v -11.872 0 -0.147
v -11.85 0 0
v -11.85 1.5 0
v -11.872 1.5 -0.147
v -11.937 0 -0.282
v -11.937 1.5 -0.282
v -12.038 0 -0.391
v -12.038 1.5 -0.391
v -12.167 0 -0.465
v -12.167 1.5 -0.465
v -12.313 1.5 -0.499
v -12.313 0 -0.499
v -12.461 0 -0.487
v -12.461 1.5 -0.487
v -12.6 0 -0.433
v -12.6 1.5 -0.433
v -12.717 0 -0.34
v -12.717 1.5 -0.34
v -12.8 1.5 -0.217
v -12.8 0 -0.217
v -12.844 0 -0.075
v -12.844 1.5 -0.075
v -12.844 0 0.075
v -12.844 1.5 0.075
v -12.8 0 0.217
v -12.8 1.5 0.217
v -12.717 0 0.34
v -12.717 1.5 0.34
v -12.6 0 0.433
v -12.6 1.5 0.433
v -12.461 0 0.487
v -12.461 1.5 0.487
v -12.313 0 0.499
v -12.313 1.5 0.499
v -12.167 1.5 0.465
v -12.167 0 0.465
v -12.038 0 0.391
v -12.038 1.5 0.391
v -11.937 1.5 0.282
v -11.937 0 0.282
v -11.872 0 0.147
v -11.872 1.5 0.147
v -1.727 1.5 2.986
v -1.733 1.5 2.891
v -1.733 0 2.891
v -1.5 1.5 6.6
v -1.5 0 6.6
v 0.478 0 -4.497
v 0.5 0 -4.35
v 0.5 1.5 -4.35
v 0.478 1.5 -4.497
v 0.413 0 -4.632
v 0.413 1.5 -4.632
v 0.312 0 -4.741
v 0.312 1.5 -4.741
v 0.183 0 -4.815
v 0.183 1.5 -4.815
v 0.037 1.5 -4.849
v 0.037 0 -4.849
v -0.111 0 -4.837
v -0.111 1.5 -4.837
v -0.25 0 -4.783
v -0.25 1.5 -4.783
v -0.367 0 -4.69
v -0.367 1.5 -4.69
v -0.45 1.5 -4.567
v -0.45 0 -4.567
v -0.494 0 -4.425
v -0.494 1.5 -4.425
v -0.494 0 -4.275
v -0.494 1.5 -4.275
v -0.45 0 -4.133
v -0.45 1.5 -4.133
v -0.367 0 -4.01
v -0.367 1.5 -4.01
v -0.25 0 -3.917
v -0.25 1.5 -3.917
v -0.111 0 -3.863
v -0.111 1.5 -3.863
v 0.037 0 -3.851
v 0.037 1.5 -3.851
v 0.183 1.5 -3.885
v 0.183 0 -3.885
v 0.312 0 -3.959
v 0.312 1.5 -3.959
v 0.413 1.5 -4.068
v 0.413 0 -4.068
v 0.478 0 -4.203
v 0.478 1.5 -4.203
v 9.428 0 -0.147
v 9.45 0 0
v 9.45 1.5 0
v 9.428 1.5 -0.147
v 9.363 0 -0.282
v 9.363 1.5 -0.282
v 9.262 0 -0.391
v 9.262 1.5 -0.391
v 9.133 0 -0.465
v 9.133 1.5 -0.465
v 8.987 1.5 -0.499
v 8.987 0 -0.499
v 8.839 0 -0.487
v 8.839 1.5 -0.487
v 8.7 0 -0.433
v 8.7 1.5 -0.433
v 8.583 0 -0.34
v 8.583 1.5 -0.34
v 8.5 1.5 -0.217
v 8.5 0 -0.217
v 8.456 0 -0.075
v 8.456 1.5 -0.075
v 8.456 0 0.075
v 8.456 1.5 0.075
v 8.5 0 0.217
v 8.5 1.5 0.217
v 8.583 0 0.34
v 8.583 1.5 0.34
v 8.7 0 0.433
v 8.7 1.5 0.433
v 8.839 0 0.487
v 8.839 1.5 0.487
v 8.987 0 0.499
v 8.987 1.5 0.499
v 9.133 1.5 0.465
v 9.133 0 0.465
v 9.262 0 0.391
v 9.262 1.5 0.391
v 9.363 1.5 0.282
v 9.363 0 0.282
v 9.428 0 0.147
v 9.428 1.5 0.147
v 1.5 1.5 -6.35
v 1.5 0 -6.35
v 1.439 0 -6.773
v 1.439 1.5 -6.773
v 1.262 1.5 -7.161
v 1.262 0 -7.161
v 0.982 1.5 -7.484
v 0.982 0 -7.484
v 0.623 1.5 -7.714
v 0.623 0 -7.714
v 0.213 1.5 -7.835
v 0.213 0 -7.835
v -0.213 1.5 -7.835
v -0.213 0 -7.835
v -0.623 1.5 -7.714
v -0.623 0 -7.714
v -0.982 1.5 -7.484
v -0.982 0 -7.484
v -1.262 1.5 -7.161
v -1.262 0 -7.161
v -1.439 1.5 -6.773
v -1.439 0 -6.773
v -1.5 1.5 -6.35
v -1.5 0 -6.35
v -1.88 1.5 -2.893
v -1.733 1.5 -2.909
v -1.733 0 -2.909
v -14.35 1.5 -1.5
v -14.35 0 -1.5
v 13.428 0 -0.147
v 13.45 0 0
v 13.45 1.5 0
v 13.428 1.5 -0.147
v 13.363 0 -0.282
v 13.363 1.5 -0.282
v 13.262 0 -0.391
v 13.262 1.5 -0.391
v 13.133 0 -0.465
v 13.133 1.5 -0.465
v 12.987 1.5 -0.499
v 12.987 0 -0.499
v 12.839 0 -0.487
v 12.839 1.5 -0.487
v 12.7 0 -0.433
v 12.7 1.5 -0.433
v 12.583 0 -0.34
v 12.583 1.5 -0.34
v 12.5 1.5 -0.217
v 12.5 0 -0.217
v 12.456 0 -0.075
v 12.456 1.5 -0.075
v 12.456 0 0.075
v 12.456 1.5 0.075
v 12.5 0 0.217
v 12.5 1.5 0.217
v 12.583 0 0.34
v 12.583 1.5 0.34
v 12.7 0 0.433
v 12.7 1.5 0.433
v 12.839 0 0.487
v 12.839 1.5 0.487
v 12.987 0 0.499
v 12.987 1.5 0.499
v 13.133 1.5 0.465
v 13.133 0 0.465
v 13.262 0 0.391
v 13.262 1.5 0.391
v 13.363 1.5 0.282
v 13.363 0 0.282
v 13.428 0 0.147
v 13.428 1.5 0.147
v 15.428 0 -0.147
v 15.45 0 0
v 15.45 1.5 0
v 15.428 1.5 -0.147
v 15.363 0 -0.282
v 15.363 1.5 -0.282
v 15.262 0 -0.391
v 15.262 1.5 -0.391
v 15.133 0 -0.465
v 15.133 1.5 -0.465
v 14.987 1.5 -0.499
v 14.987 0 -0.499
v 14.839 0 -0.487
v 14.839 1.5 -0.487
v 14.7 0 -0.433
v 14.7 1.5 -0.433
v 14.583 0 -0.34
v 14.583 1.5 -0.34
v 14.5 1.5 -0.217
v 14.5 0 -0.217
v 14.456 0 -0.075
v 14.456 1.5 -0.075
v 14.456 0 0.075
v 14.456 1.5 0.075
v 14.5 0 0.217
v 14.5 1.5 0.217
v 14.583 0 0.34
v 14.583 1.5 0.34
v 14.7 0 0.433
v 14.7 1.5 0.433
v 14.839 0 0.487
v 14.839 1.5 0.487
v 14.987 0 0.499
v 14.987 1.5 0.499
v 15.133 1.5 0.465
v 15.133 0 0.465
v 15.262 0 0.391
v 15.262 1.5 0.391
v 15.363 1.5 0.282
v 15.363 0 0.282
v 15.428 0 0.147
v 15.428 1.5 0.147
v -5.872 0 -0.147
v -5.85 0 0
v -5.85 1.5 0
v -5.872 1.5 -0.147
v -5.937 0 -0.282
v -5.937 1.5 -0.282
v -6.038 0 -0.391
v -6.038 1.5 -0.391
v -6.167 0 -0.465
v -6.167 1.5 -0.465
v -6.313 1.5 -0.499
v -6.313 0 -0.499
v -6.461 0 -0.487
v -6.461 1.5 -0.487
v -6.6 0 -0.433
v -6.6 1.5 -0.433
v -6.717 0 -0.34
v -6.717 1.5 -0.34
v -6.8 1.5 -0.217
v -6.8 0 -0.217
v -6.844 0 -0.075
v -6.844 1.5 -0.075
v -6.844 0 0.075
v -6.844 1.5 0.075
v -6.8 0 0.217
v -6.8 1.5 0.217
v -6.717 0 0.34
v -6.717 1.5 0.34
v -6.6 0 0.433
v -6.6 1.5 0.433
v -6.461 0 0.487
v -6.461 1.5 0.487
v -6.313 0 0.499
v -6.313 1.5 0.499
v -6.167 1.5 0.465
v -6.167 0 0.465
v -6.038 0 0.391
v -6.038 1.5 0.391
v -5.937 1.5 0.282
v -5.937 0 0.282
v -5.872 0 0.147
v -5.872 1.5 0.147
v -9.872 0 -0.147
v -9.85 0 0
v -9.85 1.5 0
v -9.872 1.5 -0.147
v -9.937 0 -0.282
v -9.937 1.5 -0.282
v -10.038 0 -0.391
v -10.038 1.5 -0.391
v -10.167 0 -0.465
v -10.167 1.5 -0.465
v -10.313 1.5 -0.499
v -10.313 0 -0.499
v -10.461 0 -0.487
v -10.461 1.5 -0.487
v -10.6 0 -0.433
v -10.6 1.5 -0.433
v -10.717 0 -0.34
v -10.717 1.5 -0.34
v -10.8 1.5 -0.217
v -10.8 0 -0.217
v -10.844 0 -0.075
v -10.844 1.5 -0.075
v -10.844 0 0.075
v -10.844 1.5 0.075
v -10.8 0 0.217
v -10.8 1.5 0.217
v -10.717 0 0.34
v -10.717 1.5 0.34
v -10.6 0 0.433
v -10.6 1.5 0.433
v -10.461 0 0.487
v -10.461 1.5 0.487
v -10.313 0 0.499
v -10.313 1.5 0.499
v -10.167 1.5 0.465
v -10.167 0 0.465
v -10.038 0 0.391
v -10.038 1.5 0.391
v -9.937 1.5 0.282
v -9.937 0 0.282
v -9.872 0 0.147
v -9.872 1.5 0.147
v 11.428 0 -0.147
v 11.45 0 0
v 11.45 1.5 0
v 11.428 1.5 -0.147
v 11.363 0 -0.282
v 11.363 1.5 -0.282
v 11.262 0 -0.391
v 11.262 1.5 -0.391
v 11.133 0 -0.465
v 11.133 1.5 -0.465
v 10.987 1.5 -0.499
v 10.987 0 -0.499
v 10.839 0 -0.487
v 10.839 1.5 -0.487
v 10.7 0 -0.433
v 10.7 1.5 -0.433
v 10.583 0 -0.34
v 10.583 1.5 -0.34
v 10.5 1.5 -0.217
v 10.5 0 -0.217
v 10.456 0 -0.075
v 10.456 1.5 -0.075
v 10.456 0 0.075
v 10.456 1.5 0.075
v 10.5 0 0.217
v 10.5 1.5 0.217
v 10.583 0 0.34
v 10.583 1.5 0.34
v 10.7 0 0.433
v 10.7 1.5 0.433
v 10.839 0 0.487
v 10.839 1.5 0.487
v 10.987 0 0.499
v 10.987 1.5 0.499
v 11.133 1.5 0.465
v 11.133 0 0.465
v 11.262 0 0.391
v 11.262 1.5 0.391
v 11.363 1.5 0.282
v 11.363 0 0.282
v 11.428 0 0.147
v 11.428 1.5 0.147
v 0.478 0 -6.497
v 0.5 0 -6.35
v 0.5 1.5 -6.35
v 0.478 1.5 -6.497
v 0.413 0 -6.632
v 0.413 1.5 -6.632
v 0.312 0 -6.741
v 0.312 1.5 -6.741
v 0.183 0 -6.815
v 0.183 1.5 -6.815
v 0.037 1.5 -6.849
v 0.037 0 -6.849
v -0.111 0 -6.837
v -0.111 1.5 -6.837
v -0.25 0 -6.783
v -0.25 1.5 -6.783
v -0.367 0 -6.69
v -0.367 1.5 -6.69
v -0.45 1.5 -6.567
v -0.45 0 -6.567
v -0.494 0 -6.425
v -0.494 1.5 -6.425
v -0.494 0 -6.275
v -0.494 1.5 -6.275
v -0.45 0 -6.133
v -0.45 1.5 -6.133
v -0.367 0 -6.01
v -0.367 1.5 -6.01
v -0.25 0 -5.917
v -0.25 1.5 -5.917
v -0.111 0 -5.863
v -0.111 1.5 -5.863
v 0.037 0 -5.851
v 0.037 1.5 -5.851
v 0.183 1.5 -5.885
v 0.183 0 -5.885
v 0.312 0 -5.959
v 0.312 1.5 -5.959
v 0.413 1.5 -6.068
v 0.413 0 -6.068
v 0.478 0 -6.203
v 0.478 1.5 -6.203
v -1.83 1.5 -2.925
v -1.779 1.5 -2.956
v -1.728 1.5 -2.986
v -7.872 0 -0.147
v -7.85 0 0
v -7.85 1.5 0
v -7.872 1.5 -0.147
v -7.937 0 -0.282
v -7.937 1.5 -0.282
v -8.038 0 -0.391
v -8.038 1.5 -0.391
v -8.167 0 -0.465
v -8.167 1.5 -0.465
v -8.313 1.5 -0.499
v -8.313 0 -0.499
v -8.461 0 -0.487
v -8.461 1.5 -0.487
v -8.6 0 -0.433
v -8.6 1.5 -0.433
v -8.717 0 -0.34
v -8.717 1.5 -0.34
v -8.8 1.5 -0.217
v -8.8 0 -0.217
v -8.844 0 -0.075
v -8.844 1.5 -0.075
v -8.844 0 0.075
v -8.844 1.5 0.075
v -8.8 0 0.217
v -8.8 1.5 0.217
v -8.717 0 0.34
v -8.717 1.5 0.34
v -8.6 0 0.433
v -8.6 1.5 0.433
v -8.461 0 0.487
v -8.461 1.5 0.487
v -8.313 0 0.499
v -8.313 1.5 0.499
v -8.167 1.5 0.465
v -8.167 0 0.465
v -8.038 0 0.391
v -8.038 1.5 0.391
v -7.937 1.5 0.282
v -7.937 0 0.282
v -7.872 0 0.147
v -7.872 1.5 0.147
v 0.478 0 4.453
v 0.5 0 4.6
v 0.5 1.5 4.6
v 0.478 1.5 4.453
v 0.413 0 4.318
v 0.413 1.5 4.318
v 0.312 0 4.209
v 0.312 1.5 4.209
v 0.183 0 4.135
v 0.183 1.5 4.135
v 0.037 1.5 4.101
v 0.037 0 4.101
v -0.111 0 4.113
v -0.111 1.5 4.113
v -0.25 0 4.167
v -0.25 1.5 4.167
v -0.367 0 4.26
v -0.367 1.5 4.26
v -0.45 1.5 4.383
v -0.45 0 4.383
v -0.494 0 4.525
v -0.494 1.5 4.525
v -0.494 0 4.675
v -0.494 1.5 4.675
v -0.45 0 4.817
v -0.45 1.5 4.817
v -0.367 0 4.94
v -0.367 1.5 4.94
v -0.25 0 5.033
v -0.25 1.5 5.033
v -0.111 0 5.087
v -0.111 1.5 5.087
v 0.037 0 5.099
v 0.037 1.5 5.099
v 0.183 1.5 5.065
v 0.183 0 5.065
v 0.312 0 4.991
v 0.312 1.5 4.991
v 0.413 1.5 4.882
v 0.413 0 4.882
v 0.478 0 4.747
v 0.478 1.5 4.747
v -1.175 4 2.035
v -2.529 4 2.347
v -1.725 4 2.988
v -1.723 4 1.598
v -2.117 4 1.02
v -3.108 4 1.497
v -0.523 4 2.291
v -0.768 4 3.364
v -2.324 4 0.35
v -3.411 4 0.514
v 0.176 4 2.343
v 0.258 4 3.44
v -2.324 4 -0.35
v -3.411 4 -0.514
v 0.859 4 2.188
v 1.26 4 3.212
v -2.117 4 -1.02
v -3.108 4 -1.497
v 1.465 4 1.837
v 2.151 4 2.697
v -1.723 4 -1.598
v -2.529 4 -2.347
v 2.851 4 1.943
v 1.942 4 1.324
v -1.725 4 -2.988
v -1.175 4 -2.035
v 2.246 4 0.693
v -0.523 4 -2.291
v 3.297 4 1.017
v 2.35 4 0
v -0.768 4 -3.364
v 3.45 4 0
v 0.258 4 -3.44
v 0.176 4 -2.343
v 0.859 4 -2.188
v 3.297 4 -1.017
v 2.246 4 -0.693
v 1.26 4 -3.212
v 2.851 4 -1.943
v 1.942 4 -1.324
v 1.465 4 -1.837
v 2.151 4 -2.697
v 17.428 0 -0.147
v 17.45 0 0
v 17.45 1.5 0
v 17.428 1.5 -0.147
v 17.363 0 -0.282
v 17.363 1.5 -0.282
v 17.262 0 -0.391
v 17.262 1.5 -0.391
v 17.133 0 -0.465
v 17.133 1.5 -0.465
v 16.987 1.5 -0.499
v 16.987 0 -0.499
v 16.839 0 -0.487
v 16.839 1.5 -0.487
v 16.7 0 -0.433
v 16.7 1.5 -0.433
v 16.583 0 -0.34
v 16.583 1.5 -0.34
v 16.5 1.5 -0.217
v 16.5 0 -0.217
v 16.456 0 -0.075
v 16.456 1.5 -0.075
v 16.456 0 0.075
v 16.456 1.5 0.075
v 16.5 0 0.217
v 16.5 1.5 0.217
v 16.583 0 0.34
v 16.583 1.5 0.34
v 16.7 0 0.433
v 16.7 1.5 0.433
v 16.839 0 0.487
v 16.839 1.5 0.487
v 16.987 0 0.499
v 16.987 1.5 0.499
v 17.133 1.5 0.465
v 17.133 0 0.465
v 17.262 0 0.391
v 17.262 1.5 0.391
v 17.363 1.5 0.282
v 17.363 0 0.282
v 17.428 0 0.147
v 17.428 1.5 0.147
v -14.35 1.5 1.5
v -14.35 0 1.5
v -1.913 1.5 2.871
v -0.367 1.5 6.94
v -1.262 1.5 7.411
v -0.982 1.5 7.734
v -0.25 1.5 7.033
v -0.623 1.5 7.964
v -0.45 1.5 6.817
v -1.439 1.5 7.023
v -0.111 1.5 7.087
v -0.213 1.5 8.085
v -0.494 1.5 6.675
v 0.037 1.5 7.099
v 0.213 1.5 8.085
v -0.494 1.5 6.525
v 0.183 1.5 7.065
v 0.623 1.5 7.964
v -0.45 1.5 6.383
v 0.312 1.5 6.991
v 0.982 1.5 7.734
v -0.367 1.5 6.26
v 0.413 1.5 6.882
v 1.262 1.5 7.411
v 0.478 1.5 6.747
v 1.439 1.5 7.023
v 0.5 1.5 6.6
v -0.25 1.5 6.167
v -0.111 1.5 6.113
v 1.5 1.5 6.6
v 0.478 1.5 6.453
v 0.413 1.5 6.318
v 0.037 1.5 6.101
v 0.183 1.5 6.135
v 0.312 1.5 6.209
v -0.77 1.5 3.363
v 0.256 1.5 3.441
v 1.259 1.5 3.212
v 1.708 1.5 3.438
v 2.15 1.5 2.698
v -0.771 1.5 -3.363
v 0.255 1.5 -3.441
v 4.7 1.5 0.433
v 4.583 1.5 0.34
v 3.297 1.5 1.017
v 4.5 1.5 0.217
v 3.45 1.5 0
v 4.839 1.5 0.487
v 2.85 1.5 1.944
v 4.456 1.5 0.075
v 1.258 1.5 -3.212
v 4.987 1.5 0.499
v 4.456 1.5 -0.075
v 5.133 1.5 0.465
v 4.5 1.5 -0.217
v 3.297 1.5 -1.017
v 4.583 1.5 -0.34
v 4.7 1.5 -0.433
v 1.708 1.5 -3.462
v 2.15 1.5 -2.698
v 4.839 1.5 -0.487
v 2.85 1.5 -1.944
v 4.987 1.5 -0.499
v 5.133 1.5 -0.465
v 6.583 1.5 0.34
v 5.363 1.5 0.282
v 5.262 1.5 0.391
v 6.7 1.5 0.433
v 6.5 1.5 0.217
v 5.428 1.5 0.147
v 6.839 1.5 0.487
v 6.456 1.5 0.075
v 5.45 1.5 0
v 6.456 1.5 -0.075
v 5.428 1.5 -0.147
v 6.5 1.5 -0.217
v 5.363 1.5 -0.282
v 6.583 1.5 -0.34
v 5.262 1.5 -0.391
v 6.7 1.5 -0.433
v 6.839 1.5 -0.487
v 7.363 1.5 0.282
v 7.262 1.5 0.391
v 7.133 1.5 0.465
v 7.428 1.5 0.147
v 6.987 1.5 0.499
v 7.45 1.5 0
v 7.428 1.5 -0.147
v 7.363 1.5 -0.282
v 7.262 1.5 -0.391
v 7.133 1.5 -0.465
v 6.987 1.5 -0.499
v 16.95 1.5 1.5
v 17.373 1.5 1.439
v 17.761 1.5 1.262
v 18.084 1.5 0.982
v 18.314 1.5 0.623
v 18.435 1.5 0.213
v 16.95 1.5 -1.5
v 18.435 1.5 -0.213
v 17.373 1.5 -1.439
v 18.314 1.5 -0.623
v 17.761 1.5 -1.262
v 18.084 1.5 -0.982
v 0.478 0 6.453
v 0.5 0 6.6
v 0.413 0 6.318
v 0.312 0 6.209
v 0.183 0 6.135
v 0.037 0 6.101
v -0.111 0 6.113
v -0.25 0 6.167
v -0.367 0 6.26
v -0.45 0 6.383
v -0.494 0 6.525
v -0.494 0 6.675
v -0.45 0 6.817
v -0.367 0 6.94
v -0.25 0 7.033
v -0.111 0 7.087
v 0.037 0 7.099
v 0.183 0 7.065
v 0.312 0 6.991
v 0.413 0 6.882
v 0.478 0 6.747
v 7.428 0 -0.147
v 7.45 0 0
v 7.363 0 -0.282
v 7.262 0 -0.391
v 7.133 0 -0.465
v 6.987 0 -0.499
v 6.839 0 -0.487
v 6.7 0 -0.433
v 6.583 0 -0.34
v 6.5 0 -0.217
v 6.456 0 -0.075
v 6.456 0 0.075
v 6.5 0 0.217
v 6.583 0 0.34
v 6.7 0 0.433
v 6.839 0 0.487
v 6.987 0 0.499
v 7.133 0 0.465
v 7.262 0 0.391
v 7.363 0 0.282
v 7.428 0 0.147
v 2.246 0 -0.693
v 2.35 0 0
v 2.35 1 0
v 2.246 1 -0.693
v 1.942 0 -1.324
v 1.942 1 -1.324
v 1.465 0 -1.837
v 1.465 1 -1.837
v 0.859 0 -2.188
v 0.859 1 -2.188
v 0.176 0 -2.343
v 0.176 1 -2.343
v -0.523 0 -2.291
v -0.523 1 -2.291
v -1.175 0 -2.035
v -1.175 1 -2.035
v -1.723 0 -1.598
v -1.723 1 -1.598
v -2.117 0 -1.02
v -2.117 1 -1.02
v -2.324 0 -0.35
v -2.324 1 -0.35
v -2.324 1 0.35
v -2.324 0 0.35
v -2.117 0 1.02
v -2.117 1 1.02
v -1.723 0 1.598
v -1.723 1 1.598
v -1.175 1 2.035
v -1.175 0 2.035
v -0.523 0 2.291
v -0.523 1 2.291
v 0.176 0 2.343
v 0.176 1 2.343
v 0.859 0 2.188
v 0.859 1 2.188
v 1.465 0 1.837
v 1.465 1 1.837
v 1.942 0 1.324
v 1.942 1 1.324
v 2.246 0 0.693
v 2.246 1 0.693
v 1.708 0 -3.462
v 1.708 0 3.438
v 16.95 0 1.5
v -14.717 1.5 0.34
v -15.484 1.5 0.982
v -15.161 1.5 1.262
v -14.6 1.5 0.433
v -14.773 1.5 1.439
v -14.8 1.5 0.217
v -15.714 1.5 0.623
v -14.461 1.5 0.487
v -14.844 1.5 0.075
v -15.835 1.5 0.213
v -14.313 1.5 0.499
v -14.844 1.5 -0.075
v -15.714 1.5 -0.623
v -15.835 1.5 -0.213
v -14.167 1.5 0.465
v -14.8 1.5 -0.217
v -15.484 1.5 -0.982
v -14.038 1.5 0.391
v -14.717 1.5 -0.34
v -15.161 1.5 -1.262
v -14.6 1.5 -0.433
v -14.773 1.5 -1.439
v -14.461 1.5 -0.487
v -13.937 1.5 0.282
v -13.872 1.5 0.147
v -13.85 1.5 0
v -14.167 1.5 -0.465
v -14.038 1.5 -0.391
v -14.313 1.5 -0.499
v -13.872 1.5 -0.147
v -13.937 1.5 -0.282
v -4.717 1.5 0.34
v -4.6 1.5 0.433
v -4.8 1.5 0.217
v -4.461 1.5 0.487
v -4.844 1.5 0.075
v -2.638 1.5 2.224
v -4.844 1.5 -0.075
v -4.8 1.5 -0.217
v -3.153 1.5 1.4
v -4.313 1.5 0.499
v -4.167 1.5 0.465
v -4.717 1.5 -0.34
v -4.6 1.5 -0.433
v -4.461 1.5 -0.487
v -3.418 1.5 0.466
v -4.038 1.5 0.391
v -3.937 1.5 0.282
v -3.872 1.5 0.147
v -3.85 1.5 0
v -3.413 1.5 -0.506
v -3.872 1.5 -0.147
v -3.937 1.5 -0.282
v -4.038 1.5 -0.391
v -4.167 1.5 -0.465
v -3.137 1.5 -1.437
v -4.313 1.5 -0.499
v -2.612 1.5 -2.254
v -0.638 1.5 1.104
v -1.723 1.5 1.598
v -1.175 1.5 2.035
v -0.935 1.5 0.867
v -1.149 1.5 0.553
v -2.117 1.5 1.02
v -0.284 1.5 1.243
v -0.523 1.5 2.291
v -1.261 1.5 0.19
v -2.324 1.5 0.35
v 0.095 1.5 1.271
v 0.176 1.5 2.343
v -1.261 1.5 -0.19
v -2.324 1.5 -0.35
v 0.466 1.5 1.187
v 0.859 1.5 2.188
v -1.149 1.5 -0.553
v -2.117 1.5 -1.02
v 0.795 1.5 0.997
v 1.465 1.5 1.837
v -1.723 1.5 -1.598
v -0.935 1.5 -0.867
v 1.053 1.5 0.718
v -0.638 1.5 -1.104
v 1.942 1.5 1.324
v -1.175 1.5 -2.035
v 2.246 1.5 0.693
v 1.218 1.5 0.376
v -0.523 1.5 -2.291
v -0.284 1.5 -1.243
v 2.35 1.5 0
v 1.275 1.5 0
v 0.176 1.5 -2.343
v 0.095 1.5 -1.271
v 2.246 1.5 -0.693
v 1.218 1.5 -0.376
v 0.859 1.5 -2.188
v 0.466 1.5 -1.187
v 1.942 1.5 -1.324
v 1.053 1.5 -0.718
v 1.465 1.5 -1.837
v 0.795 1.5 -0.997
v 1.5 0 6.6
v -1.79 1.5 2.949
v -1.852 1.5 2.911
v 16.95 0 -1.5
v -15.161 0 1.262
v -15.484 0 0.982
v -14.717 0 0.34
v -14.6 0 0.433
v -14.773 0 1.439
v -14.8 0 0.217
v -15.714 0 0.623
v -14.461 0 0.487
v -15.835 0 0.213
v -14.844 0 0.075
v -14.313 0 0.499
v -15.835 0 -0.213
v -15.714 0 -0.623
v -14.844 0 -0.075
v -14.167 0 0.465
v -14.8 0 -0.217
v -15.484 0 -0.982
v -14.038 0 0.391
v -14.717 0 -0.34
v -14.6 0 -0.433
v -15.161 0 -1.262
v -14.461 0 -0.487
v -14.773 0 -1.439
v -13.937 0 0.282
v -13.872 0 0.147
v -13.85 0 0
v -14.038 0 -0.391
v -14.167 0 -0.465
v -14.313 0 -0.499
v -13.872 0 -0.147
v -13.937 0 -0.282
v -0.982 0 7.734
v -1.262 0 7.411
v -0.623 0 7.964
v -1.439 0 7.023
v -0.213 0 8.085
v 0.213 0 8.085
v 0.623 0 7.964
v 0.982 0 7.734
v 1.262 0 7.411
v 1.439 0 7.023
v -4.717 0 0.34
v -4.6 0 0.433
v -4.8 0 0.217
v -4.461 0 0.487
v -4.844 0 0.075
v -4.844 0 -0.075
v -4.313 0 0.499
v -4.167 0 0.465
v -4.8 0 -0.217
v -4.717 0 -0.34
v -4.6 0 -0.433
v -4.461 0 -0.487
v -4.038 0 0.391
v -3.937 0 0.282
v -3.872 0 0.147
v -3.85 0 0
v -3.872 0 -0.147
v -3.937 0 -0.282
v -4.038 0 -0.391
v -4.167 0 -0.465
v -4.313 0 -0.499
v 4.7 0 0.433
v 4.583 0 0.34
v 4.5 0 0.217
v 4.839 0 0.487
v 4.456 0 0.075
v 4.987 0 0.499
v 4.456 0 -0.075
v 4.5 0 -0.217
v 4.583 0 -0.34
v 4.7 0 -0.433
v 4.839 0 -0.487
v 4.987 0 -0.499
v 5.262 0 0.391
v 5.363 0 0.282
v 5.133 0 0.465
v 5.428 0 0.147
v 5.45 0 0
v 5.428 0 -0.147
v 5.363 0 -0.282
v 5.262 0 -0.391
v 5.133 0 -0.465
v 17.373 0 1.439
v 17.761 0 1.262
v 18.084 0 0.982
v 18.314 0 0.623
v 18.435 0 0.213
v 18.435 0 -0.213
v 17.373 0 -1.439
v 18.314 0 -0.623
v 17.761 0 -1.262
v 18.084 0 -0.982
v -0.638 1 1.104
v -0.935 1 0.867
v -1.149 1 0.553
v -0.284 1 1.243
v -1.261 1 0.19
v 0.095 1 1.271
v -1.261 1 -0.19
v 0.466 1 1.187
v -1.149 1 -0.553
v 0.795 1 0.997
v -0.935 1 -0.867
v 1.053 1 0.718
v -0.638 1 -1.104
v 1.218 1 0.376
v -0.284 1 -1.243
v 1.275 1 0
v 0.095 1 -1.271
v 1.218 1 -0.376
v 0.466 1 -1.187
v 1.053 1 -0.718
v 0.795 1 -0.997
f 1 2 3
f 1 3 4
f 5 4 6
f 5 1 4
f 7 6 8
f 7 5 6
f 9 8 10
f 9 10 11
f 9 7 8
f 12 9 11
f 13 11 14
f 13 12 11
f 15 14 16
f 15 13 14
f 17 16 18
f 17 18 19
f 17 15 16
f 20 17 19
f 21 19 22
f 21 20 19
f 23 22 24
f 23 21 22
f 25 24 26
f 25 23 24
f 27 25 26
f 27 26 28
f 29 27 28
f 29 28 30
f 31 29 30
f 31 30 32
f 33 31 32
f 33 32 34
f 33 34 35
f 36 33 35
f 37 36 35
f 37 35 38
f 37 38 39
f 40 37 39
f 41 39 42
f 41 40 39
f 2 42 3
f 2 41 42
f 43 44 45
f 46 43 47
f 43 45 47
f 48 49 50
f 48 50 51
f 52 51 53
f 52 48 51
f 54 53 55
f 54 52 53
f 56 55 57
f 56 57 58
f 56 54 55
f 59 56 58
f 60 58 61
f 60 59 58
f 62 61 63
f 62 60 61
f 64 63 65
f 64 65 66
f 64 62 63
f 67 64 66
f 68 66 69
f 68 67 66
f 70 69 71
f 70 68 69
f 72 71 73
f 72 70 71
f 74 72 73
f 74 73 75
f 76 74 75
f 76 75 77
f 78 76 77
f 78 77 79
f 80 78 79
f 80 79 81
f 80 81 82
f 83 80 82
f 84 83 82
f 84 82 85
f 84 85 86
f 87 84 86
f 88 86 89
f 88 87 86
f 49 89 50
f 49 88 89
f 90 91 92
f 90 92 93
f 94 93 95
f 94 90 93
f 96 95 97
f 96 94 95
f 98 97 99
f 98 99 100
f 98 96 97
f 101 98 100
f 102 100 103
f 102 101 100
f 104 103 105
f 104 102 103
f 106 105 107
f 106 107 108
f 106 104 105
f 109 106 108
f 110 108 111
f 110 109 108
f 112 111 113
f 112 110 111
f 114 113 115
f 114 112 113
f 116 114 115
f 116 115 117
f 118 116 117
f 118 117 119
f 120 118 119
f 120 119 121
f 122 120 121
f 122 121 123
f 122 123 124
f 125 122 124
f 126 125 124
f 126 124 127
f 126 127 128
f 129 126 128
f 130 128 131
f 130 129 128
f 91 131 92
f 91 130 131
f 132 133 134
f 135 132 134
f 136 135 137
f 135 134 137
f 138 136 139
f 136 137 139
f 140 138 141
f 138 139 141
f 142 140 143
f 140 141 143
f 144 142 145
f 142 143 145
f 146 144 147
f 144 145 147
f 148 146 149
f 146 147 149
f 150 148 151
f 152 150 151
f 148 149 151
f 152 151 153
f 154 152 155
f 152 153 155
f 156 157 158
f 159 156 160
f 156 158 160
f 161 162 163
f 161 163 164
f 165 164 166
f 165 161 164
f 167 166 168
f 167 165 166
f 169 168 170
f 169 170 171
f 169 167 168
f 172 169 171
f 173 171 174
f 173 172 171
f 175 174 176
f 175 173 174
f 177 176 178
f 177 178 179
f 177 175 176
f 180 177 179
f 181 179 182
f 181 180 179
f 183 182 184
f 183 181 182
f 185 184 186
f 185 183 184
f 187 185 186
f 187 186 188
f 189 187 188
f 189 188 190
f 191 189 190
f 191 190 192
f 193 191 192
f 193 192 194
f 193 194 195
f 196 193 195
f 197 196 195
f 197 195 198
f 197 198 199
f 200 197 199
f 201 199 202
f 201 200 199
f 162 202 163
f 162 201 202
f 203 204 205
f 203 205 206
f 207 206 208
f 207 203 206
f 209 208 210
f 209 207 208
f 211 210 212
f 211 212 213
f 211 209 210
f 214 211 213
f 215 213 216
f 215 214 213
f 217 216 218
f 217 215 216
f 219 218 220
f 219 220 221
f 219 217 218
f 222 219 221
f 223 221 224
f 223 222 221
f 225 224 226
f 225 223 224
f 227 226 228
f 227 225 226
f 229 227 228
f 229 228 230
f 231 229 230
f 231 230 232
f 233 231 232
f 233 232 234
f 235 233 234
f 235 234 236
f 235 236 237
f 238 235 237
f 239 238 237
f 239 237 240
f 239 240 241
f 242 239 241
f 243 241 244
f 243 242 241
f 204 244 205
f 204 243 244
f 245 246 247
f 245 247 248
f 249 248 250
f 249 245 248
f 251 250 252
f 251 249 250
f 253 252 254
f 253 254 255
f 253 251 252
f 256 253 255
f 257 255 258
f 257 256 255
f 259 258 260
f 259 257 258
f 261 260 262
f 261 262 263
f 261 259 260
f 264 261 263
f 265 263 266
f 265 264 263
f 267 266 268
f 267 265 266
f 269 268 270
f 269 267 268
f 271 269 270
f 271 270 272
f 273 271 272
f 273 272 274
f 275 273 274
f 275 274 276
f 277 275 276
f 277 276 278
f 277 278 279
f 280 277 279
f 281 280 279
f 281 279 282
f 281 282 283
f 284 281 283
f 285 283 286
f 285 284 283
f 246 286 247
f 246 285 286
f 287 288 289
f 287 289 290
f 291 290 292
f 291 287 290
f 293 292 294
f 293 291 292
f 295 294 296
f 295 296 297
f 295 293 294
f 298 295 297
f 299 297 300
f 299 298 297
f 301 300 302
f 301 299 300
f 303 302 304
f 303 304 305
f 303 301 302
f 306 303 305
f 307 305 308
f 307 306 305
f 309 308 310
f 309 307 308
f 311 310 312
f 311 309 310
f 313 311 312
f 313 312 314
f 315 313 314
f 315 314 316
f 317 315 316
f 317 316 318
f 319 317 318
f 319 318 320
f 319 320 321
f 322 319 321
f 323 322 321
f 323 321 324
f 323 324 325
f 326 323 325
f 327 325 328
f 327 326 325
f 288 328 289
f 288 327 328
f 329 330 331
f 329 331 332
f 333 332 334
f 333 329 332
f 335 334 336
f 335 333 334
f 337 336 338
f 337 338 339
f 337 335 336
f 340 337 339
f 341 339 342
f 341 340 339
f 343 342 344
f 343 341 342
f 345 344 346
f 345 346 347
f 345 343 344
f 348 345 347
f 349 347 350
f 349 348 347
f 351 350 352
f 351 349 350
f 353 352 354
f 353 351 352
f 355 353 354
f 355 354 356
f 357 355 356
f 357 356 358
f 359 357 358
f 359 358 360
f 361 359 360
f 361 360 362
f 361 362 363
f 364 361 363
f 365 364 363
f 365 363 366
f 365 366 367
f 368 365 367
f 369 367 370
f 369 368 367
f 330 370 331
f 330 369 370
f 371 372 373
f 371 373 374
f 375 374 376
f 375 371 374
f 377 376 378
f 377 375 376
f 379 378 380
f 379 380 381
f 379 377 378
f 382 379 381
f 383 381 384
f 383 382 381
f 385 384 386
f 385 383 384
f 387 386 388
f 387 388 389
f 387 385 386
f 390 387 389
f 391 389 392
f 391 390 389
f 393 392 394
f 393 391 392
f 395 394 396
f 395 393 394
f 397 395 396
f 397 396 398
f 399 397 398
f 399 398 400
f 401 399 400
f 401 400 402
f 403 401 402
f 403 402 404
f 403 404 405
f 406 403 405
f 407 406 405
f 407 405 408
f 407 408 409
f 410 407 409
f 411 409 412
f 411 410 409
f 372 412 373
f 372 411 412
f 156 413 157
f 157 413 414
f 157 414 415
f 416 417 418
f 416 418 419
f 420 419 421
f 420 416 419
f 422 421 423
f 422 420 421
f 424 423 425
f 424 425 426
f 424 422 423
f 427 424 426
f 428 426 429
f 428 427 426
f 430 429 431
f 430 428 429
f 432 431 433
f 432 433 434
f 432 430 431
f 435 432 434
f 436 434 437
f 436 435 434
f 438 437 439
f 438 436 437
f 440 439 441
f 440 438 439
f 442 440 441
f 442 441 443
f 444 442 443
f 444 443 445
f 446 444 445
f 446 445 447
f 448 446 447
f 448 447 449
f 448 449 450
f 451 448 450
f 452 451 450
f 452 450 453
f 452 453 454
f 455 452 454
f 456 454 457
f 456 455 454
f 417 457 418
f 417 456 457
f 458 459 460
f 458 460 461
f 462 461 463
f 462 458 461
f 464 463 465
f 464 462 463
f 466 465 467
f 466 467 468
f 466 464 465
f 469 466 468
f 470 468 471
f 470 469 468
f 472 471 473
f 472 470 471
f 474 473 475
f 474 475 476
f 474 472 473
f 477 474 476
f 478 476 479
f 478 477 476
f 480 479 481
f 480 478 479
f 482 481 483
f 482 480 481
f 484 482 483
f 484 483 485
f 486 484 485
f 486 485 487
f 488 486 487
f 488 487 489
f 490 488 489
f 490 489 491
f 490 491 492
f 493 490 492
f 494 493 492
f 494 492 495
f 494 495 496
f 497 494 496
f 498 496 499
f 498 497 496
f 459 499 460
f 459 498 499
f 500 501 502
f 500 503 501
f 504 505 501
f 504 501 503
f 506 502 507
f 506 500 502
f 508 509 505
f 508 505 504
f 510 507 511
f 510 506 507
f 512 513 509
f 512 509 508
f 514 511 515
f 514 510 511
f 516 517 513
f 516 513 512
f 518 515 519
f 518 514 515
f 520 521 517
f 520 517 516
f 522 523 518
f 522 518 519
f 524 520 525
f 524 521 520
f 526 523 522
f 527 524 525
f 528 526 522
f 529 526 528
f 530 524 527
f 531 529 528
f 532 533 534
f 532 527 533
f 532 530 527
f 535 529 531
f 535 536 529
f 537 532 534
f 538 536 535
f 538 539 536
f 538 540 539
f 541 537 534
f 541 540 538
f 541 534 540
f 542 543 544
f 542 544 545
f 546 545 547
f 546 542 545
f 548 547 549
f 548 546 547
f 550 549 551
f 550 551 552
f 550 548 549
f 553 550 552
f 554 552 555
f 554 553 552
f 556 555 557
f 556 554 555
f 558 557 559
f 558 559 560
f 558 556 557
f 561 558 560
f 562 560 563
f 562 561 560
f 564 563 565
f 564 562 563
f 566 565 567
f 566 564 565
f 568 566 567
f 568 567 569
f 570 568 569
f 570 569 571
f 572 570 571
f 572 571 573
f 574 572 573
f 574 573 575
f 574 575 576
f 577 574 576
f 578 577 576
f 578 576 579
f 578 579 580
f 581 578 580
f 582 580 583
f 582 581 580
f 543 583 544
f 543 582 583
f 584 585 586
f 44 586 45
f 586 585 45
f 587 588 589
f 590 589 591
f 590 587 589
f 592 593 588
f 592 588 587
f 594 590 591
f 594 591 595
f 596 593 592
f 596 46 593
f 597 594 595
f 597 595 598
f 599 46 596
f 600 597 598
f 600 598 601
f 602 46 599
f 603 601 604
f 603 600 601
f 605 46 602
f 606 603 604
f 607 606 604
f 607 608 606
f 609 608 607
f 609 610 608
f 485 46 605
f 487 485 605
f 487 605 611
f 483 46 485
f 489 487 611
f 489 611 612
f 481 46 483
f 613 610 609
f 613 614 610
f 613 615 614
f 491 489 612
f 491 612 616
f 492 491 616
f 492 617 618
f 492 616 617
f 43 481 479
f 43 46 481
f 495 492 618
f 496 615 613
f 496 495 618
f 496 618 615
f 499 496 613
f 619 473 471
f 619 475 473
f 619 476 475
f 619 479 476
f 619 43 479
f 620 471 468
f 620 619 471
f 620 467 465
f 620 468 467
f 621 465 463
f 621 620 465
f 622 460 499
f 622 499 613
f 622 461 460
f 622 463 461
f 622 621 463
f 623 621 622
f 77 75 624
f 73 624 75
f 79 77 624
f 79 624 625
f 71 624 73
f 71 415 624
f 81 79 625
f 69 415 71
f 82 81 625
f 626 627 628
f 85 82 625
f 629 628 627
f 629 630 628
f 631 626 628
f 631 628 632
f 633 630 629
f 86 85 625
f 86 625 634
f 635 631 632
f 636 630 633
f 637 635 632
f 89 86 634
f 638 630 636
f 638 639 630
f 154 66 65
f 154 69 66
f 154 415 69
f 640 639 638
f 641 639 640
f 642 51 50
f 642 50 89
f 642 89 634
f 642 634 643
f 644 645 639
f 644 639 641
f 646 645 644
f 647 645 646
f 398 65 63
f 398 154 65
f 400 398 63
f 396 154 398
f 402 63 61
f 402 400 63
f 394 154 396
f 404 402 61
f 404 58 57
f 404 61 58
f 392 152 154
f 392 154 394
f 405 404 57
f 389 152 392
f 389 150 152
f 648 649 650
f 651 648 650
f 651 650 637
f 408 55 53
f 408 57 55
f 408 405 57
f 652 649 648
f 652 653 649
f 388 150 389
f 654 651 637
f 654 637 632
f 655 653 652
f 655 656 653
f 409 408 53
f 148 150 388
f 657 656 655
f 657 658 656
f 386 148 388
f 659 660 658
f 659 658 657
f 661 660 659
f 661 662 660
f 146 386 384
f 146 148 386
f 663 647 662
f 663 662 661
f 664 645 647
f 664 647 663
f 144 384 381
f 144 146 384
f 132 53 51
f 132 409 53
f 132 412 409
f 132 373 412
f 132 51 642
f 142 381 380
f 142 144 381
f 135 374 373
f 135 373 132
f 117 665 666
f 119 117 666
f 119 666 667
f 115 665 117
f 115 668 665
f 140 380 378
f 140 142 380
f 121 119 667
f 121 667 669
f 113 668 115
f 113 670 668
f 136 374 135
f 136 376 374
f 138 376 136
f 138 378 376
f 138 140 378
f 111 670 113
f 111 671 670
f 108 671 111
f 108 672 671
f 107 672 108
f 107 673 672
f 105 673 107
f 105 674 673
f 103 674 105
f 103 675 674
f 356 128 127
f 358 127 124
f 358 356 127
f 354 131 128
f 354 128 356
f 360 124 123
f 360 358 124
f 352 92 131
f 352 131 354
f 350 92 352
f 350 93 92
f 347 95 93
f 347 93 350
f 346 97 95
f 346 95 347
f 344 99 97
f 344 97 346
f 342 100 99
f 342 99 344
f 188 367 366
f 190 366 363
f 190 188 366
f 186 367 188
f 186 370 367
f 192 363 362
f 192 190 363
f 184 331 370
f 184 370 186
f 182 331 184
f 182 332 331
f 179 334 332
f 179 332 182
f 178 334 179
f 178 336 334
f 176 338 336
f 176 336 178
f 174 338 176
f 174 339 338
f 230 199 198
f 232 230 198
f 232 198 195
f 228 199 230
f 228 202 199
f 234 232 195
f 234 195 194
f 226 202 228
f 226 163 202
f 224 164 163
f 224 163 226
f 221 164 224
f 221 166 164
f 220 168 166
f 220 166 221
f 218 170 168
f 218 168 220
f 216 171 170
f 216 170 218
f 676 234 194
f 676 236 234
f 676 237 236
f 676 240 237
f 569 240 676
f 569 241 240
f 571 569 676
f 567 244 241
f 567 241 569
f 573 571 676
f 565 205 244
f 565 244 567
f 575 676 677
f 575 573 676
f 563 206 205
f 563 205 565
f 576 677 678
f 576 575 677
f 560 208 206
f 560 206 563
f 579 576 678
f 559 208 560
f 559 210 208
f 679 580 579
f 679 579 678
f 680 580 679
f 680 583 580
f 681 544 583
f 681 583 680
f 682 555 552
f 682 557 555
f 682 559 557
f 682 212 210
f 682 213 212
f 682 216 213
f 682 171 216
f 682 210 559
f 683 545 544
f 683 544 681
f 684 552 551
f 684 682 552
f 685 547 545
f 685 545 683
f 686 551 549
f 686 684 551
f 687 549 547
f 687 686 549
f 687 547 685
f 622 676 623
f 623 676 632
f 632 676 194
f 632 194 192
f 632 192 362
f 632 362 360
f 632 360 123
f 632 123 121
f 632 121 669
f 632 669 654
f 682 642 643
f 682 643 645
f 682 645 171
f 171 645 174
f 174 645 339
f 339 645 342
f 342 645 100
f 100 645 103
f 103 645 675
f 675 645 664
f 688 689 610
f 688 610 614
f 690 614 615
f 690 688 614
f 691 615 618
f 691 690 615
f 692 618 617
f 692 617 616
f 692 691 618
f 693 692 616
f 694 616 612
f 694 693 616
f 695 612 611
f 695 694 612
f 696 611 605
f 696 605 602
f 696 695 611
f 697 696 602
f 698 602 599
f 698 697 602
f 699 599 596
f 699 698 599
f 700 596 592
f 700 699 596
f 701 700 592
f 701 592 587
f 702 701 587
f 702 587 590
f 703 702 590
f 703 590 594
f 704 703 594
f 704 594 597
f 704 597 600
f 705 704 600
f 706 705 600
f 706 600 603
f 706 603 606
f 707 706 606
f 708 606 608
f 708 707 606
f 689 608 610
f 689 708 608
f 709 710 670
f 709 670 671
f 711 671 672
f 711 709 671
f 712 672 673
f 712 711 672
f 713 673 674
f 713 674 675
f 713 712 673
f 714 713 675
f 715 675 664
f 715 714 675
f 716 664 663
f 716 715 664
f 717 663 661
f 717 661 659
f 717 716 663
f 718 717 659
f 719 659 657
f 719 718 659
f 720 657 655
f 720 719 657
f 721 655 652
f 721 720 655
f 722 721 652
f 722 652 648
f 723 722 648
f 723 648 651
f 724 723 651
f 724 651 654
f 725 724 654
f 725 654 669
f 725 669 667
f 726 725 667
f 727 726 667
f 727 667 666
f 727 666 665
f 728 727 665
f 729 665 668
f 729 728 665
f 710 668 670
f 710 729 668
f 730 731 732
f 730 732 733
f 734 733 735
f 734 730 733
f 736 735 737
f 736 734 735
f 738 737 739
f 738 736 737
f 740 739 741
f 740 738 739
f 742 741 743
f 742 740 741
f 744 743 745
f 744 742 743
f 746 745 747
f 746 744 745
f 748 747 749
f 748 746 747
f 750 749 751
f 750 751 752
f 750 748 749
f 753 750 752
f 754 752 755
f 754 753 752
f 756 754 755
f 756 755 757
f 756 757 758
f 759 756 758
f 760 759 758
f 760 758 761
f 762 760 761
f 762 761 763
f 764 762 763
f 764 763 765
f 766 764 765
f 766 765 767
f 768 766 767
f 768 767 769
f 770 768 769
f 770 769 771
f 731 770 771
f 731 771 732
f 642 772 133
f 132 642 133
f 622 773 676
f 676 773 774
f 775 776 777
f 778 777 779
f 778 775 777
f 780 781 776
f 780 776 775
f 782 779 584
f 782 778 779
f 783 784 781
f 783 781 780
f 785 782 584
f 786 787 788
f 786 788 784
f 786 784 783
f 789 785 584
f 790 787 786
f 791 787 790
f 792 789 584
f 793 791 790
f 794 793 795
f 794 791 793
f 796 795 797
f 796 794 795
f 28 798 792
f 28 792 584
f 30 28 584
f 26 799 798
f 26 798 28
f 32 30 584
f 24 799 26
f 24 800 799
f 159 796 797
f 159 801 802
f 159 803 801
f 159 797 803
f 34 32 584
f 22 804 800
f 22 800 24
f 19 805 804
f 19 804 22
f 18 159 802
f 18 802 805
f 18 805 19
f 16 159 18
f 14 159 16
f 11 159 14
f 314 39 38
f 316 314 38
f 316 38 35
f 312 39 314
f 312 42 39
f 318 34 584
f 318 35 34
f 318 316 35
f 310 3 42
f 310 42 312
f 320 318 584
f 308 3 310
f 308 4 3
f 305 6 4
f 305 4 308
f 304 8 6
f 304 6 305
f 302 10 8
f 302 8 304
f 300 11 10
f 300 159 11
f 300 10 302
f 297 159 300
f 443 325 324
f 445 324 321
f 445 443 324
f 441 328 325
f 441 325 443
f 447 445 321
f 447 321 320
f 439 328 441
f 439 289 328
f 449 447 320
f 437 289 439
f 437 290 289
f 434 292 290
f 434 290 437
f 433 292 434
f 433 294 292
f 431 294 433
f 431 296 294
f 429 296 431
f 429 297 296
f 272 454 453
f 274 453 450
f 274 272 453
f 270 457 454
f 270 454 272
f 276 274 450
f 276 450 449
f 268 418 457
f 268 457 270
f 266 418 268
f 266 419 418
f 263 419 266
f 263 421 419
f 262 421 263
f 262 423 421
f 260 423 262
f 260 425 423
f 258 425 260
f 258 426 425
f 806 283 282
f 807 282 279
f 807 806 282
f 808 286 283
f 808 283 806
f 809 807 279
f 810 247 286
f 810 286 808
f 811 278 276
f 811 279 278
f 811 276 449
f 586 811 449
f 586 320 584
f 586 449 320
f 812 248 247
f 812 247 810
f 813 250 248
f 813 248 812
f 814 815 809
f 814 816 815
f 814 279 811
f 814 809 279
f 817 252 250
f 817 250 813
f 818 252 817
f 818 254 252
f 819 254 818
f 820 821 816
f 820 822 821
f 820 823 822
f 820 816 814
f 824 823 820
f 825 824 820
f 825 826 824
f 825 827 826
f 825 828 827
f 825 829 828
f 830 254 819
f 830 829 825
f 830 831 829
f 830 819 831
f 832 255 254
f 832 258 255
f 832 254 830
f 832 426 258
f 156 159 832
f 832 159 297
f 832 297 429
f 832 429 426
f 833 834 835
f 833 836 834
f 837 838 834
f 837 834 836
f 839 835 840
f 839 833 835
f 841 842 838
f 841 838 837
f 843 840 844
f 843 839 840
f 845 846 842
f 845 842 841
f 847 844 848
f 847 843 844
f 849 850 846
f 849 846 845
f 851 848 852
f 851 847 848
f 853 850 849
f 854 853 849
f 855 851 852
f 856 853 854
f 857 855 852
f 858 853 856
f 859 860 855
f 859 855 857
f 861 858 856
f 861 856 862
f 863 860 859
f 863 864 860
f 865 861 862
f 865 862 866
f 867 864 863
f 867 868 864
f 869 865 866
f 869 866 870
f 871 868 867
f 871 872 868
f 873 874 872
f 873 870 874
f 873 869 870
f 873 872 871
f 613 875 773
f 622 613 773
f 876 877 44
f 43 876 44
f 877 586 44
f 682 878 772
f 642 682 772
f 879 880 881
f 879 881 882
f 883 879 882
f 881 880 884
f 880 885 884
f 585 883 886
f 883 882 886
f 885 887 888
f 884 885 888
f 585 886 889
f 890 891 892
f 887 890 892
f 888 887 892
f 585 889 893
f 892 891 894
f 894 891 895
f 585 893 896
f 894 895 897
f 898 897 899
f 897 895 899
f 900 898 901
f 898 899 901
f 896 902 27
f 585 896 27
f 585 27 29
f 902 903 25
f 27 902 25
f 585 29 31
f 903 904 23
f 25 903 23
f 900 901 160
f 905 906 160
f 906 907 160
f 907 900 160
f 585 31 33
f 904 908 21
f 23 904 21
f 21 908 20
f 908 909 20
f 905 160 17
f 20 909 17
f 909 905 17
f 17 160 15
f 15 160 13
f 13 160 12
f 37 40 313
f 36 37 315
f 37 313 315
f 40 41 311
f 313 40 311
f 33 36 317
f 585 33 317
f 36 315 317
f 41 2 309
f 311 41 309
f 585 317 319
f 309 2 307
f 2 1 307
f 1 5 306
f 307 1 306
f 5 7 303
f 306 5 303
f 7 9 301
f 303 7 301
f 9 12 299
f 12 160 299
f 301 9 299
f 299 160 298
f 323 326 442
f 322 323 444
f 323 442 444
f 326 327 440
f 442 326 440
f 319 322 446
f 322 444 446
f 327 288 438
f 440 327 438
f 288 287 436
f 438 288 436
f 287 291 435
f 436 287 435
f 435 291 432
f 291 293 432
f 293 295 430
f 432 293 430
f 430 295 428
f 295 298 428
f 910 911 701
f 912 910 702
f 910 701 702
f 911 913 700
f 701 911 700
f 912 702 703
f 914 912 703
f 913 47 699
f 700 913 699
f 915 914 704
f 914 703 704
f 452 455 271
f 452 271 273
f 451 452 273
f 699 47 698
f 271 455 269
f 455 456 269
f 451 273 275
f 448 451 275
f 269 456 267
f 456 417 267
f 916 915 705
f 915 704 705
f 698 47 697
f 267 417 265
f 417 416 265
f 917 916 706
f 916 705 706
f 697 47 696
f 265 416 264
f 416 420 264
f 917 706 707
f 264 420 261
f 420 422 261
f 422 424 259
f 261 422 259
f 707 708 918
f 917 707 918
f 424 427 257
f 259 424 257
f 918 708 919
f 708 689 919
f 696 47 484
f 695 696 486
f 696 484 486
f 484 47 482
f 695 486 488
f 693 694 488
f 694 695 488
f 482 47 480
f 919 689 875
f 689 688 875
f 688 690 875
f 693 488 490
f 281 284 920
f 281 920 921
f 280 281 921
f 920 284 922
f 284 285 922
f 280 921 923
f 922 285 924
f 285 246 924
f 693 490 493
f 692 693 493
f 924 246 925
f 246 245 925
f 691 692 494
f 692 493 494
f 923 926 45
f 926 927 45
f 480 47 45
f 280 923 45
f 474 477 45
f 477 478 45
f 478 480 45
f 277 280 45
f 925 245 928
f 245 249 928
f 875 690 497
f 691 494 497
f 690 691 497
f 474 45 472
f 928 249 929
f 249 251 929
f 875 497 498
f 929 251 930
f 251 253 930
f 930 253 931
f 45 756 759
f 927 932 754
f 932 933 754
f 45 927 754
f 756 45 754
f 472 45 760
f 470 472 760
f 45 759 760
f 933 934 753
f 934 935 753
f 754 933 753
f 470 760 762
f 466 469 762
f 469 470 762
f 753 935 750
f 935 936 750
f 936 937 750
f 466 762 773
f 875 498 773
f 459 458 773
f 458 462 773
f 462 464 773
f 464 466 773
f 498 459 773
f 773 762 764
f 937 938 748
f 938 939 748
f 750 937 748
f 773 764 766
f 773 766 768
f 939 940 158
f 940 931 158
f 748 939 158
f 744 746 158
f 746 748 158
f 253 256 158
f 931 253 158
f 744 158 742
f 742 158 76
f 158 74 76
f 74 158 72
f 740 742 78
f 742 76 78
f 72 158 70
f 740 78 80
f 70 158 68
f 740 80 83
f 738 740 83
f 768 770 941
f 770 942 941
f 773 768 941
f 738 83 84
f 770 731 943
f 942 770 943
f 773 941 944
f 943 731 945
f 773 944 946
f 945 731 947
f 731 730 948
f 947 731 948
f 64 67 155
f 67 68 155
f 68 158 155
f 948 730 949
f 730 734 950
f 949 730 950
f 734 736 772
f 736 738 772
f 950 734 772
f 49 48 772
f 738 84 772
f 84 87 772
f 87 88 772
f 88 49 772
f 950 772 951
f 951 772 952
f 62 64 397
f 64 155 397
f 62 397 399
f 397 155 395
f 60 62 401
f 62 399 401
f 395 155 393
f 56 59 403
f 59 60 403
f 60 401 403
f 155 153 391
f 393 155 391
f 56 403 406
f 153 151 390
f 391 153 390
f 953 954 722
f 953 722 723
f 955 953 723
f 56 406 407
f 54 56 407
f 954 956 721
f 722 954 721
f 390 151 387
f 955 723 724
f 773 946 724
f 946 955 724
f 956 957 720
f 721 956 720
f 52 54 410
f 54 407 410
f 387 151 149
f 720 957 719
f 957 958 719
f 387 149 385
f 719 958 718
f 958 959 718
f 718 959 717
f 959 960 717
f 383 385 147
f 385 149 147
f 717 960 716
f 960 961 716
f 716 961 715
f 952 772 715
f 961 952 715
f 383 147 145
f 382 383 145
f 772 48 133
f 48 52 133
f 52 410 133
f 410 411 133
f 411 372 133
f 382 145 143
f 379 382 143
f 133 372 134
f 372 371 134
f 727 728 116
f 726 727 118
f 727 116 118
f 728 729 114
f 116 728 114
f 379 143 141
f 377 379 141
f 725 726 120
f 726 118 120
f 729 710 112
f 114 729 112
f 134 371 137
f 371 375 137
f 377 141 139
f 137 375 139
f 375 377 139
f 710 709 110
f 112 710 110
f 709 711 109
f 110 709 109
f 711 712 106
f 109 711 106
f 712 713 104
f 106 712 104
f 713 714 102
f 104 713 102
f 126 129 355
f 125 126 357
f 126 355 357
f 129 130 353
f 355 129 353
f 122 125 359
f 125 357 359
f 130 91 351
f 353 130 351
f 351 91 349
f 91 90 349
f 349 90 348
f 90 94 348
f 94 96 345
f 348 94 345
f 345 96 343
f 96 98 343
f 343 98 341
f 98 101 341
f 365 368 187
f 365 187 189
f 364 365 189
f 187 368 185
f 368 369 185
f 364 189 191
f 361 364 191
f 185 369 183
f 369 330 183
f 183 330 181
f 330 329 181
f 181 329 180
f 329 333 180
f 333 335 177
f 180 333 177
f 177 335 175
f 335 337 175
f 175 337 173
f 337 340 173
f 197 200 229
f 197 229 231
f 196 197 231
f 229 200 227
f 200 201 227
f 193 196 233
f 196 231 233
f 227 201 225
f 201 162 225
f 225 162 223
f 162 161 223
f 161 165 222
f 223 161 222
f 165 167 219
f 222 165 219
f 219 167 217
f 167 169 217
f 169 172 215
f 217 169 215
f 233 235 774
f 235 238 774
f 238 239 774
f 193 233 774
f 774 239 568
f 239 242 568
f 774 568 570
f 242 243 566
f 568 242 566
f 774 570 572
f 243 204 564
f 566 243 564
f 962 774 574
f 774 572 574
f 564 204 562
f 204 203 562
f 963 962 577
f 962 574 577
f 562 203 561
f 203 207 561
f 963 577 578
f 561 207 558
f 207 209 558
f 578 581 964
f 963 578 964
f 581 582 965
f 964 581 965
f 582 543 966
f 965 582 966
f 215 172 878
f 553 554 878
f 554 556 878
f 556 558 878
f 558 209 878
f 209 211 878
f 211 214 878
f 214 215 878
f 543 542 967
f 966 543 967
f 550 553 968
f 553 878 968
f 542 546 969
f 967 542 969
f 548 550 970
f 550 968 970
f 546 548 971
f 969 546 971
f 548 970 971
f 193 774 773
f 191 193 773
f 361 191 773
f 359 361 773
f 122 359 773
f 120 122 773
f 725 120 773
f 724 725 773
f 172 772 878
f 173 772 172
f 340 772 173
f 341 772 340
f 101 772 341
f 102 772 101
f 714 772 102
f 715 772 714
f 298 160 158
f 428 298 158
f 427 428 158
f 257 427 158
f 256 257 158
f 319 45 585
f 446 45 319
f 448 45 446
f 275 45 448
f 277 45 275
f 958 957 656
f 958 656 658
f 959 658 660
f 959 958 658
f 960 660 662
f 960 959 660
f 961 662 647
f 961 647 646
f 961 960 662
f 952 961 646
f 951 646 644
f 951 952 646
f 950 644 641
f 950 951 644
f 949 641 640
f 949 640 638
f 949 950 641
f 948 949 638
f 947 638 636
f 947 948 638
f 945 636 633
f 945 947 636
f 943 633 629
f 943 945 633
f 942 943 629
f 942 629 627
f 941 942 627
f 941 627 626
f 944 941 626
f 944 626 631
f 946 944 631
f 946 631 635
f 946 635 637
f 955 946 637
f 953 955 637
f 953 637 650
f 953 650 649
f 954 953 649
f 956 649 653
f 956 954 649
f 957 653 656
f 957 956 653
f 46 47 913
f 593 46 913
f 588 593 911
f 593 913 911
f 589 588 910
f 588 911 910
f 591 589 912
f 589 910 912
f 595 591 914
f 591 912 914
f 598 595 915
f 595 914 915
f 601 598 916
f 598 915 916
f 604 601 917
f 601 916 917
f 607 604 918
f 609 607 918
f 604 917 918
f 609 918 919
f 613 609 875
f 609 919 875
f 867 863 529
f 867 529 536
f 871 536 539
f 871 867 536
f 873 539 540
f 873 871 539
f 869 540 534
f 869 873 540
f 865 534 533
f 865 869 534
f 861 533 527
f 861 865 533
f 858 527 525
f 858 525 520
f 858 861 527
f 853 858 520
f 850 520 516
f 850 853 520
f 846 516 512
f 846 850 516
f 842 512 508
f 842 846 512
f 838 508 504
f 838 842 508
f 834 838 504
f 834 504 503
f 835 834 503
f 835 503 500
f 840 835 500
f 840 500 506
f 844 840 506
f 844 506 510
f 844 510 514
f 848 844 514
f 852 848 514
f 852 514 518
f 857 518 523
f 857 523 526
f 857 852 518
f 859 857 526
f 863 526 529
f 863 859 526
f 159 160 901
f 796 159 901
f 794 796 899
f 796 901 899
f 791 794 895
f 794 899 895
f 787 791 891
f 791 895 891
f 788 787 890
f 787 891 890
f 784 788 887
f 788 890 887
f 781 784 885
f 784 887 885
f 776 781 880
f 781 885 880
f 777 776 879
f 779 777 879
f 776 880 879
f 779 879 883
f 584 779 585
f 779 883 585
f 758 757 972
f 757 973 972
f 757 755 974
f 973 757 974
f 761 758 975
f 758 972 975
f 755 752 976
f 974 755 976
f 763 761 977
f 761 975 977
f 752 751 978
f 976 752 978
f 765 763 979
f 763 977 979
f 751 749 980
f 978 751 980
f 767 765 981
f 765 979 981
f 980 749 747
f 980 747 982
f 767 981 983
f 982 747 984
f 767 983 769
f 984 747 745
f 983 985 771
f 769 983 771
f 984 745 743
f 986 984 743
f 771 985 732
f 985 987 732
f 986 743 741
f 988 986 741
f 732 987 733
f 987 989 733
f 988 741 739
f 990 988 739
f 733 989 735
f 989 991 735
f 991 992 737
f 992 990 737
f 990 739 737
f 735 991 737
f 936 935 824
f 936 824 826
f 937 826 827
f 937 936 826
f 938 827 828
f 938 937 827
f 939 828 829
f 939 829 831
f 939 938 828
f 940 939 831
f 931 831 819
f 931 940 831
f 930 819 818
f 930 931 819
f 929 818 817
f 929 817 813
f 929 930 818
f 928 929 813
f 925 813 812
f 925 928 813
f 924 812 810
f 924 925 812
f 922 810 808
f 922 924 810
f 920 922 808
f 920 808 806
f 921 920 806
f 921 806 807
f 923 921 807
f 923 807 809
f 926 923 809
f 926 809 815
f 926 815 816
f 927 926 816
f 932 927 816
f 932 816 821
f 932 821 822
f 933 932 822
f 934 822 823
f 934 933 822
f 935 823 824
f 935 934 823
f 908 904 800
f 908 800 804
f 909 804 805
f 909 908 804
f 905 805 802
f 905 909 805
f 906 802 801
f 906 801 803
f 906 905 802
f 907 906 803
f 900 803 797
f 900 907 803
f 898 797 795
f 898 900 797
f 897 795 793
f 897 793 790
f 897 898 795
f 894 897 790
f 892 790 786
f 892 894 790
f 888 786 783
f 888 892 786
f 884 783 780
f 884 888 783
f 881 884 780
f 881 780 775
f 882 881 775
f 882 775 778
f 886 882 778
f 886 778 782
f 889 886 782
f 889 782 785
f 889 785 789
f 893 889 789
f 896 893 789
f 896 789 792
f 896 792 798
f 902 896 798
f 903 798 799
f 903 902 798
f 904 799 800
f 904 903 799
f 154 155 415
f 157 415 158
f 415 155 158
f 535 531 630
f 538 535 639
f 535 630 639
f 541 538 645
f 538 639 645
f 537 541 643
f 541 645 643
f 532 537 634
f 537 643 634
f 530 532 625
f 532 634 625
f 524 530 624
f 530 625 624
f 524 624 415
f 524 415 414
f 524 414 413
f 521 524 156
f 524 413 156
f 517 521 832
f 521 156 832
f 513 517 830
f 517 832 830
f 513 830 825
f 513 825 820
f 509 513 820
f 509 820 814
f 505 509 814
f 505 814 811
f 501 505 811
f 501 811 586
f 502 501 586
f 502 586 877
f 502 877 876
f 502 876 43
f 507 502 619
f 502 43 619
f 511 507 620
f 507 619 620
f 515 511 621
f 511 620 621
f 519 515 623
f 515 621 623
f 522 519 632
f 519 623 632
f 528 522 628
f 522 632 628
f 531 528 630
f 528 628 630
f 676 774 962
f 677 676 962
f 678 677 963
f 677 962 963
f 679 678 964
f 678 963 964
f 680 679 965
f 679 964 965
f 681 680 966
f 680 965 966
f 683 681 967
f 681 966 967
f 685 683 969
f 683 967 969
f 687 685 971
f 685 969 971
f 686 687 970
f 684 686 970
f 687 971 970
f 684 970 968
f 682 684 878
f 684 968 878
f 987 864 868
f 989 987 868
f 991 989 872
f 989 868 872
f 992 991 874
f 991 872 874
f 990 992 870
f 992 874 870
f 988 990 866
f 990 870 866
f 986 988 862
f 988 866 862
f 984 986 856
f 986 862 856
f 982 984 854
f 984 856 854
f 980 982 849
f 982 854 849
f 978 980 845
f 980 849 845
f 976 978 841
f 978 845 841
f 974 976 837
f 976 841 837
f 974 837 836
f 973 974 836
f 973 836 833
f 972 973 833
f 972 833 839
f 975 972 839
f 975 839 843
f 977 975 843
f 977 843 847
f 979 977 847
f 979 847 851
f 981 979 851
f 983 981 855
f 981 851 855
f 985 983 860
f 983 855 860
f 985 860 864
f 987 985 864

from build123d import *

# Parameters (mm, degrees)
SKETCH1_R           = 0.5
SKETCH1_R_2         = 2.35
BOSS_EXTRUDE1_DEPTH = 1.5
BOSS_EXTRUDE2_START = -0.5
SKETCH6_R           = 2.35
SKETCH6_R_2         = 1.275
BOSS_EXTRUDE2_DEPTH = 0.5
SKETCH6_3_R         = 3.45
SKETCH6_3_R_2       = 2.35
BOSS_EXTRUDE3_DEPTH = 2.5


with BuildPart() as part:
    # Sketch1 → Boss-Extrude1 (new body)
    with BuildSketch(Plane(origin=(0, 0, 0), x_dir=(1, 0, 0), z_dir=(0, 1, 0))):
        with BuildLine():
            ThreePointArc((16.95, -1.5), (18.45, 0), (16.95, 1.5))
            Line((16.95, 1.5), (1.708462071, 3.462274604))
            Line((1.708462071, 3.462274604), (1.5, 6.35))
            ThreePointArc((1.5, 6.35), (0, 7.85), (-1.5, 6.35))
            Line((-1.5, 6.35), (-1.733484834, 2.909271084))
            Line((-1.733484834, 2.909271084), (-14.35, 1.5))
            ThreePointArc((-14.35, 1.5), (-15.85, 0), (-14.35, -1.5))
            Line((-14.35, -1.5), (-1.733484834, -2.890728916))
            Line((-1.733484834, -2.890728916), (-1.5, -6.6))
            ThreePointArc((-1.5, -6.6), (0, -8.1), (1.5, -6.6))
            Line((1.5, -6.6), (1.708462071, -3.437725396))
            Line((1.708462071, -3.437725396), (16.95, -1.5))
        make_face()
        with Locations((0, -6.6)):
            Circle(SKETCH1_R, mode=Mode.SUBTRACT)
        with Locations((0, -4.6)):
            Circle(SKETCH1_R, mode=Mode.SUBTRACT)
        with Locations((-14.35, 0)):
            Circle(SKETCH1_R, mode=Mode.SUBTRACT)
        with Locations((-12.35, 0)):
            Circle(SKETCH1_R, mode=Mode.SUBTRACT)
        with Locations((-10.35, 0)):
            Circle(SKETCH1_R, mode=Mode.SUBTRACT)
        with Locations((-8.35, 0)):
            Circle(SKETCH1_R, mode=Mode.SUBTRACT)
        with Locations((-6.35, 0)):
            Circle(SKETCH1_R, mode=Mode.SUBTRACT)
        with Locations((-4.35, 0)):
            Circle(SKETCH1_R, mode=Mode.SUBTRACT)
        Circle(SKETCH1_R_2, mode=Mode.SUBTRACT)
        with Locations((0, 4.35)):
            Circle(SKETCH1_R, mode=Mode.SUBTRACT)
        with Locations((0, 6.35)):
            Circle(SKETCH1_R, mode=Mode.SUBTRACT)
        with Locations((4.95, 0)):
            Circle(SKETCH1_R, mode=Mode.SUBTRACT)
        with Locations((6.95, 0)):
            Circle(SKETCH1_R, mode=Mode.SUBTRACT)
        with Locations((8.95, 0)):
            Circle(SKETCH1_R, mode=Mode.SUBTRACT)
        with Locations((10.95, 0)):
            Circle(SKETCH1_R, mode=Mode.SUBTRACT)
        with Locations((12.95, 0)):
            Circle(SKETCH1_R, mode=Mode.SUBTRACT)
        with Locations((14.95, 0)):
            Circle(SKETCH1_R, mode=Mode.SUBTRACT)
        with Locations((16.95, 0)):
            Circle(SKETCH1_R, mode=Mode.SUBTRACT)
    extrude(amount=BOSS_EXTRUDE1_DEPTH)

    # Sketch6 → Boss-Extrude2 (add)
    with BuildSketch(Plane(origin=(0, 1.5, 0), x_dir=(1, 0, 0), z_dir=(0, 1, 0)).offset(BOSS_EXTRUDE2_START)):
        Circle(SKETCH6_R)
        Circle(SKETCH6_R_2, mode=Mode.SUBTRACT)
    extrude(amount=BOSS_EXTRUDE2_DEPTH)

    # Sketch6<3> → Boss-Extrude3 (add)
    with BuildSketch(Plane(origin=(0, 1.5, 0), x_dir=(1, 0, 0), z_dir=(0, 1, 0))):
        Circle(SKETCH6_3_R)
        Circle(SKETCH6_3_R_2, mode=Mode.SUBTRACT)
    extrude(amount=BOSS_EXTRUDE3_DEPTH)


solid = part.part
